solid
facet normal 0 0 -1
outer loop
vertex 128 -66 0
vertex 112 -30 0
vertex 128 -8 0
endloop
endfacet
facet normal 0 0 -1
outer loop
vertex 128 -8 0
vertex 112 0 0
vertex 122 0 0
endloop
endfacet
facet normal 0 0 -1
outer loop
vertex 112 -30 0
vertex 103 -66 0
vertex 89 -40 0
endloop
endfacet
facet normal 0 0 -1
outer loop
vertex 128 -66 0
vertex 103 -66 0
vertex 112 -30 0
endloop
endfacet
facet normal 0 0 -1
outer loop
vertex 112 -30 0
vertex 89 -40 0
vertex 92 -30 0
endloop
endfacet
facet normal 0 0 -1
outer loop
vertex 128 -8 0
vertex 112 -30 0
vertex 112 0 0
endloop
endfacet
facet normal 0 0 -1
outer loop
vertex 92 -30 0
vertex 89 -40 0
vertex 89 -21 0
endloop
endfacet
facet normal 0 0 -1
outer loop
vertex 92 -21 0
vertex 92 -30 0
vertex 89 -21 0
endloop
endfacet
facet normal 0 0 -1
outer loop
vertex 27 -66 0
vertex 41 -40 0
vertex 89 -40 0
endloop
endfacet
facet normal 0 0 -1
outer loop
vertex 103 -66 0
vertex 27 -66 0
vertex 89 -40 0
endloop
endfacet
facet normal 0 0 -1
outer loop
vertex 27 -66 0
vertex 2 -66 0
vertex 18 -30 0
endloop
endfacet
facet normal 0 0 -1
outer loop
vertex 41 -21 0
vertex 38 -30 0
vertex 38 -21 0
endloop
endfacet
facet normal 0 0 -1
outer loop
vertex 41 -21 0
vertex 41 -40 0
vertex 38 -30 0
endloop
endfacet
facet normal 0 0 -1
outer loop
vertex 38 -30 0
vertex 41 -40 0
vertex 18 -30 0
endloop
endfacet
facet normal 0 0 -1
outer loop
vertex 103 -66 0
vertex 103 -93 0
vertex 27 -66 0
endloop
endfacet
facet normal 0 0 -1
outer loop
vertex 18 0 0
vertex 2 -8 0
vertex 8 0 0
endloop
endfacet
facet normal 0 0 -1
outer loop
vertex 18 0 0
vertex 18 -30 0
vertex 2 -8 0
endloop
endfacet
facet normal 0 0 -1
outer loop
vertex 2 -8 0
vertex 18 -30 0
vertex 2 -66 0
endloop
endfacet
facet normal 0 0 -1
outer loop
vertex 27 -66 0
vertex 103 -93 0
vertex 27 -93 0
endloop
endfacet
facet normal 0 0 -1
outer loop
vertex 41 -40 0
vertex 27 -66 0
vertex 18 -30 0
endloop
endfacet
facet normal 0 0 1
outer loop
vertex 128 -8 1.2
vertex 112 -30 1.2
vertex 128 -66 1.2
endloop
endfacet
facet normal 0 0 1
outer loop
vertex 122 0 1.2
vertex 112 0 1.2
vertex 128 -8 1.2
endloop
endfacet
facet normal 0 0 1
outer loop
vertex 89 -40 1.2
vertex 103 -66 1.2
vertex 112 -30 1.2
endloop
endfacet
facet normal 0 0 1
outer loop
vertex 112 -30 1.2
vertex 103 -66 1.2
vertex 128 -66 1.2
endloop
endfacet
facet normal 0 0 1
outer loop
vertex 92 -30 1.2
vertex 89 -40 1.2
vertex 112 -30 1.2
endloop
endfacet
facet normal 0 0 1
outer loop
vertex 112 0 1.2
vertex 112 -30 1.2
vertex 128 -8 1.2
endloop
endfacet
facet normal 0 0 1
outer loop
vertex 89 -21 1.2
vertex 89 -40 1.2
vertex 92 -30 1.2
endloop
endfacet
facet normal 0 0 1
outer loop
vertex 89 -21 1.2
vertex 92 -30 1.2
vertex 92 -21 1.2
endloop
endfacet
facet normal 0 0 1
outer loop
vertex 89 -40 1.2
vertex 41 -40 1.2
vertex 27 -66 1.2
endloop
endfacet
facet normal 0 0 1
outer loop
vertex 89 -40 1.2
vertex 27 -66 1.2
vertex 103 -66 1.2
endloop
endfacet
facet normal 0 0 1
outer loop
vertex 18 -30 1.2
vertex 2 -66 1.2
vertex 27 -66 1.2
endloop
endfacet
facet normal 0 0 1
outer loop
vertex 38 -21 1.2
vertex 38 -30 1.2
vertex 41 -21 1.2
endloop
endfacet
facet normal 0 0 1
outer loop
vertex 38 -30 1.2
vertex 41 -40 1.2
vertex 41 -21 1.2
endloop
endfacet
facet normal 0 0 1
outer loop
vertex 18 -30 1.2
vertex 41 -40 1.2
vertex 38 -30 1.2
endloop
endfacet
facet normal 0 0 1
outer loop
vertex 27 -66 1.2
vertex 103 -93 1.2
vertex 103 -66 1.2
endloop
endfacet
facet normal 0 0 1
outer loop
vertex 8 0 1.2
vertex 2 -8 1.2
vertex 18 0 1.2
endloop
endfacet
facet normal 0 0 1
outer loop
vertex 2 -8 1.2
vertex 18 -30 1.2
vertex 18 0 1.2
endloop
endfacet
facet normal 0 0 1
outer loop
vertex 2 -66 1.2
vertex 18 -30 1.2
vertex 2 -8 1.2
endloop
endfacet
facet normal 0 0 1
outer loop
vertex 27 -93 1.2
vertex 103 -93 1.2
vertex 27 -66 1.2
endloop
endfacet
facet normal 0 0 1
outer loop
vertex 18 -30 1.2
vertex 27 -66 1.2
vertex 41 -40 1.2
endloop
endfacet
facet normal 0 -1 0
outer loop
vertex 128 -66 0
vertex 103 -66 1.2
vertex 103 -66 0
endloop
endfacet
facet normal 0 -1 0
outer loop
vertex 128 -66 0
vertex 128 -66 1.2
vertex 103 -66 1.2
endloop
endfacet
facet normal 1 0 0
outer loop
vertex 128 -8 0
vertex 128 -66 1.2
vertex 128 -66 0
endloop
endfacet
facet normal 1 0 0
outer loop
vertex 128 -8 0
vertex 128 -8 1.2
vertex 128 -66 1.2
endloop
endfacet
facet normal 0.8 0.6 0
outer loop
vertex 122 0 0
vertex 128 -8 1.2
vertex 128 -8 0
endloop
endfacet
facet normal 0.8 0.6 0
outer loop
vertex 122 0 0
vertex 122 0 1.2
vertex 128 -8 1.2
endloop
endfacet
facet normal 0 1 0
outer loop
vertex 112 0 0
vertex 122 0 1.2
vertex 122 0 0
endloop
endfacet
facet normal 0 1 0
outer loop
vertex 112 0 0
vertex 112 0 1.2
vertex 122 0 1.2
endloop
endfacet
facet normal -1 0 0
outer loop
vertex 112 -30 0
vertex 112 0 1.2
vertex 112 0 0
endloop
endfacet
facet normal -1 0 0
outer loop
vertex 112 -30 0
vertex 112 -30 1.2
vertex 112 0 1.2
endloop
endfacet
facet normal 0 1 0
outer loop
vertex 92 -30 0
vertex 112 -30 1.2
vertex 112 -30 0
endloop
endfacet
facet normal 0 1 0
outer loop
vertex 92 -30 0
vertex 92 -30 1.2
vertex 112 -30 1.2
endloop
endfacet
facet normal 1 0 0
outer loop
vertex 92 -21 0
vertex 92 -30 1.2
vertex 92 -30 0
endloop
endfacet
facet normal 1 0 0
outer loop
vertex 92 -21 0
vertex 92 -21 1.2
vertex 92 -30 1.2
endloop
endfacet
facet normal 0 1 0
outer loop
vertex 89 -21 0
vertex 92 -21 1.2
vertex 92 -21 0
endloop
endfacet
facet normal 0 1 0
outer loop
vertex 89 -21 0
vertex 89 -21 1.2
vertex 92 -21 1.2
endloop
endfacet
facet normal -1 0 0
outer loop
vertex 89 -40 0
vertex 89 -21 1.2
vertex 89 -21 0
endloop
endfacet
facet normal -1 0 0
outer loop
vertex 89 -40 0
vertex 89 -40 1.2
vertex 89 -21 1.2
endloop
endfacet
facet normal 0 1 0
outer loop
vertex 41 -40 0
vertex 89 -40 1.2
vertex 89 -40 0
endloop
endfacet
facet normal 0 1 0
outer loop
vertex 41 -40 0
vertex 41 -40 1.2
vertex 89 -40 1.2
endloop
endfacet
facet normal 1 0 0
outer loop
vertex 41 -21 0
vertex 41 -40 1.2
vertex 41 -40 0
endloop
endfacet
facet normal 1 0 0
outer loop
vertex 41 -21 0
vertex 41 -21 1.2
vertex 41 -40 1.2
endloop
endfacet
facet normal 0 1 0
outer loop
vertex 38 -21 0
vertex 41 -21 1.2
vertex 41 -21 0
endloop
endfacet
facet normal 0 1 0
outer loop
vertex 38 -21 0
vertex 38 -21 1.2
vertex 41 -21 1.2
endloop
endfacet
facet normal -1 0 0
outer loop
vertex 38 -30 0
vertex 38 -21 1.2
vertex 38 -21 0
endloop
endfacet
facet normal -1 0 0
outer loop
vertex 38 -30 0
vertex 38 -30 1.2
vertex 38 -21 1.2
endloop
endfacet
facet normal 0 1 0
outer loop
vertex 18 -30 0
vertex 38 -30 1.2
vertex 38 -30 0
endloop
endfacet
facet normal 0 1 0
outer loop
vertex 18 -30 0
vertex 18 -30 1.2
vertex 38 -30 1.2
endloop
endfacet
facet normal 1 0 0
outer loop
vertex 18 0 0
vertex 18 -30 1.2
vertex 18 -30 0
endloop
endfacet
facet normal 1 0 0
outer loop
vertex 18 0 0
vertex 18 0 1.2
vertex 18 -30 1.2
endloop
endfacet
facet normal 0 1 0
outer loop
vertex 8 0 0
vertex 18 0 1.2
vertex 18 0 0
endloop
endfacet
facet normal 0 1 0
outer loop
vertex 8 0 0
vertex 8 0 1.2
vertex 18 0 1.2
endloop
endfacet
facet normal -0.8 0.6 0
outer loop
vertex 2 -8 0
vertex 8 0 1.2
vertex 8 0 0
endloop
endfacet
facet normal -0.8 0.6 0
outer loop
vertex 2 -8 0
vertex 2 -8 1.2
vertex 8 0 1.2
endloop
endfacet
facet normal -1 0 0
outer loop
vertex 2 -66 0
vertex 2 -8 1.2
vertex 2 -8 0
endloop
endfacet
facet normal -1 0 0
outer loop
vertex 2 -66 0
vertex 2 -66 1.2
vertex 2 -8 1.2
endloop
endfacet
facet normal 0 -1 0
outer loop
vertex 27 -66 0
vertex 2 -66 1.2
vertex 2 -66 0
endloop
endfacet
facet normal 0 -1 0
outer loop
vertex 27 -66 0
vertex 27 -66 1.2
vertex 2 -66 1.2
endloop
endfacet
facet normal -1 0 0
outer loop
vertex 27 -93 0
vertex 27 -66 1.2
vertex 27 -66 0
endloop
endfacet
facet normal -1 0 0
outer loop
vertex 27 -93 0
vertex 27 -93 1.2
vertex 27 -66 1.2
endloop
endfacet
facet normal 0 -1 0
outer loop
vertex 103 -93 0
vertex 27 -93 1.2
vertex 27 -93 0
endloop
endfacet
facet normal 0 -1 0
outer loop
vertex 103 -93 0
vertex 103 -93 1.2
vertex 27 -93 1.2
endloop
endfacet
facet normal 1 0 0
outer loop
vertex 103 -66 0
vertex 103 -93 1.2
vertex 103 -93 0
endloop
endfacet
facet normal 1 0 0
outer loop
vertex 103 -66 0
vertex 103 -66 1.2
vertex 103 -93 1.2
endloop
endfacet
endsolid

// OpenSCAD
// T3_RemovalTool.scad — replica of the Control4 factory fork tool that
// releases a T3 In-Wall touch screen from its power box. Human-editable source
// of the same profile gen_stl.py emits. Profile reverse-engineered from a
// ruler-calibrated photo of the real steel tool and verified by overlay.
// Render:  openscad -o T3_RemovalTool.stl T3_RemovalTool.scad
//
// Two tall OUTER prongs slide up the wall behind the screen to release the two
// bottom latch tabs; the central pocket clears the centre boss. Overall ~130 x
// 92 mm. Real part is ~1 mm steel — see README for the print thickness/fit
// caveat. +x right, +y measured DOWN from the prong tips.

thickness = 1.2;   // mm — try this first (close to the 1 mm steel)

outline = [
    [2,8],[8,0],[18,0],[18,30],[38,30],[38,21],[41,21],[41,40],[89,40],
    [89,21],[92,21],[92,30],[112,30],[112,0],[122,0],[128,8],[128,66],
    [103,66],[103,93],[27,93],[27,66],[2,66]
];

// y is measured downward in the table above; mirror to standard +y-up so the
// print sits the natural way, then extrude.
linear_extrude(height = thickness)
    polygon([ for (p = outline) [p[0], -p[1]] ]);
